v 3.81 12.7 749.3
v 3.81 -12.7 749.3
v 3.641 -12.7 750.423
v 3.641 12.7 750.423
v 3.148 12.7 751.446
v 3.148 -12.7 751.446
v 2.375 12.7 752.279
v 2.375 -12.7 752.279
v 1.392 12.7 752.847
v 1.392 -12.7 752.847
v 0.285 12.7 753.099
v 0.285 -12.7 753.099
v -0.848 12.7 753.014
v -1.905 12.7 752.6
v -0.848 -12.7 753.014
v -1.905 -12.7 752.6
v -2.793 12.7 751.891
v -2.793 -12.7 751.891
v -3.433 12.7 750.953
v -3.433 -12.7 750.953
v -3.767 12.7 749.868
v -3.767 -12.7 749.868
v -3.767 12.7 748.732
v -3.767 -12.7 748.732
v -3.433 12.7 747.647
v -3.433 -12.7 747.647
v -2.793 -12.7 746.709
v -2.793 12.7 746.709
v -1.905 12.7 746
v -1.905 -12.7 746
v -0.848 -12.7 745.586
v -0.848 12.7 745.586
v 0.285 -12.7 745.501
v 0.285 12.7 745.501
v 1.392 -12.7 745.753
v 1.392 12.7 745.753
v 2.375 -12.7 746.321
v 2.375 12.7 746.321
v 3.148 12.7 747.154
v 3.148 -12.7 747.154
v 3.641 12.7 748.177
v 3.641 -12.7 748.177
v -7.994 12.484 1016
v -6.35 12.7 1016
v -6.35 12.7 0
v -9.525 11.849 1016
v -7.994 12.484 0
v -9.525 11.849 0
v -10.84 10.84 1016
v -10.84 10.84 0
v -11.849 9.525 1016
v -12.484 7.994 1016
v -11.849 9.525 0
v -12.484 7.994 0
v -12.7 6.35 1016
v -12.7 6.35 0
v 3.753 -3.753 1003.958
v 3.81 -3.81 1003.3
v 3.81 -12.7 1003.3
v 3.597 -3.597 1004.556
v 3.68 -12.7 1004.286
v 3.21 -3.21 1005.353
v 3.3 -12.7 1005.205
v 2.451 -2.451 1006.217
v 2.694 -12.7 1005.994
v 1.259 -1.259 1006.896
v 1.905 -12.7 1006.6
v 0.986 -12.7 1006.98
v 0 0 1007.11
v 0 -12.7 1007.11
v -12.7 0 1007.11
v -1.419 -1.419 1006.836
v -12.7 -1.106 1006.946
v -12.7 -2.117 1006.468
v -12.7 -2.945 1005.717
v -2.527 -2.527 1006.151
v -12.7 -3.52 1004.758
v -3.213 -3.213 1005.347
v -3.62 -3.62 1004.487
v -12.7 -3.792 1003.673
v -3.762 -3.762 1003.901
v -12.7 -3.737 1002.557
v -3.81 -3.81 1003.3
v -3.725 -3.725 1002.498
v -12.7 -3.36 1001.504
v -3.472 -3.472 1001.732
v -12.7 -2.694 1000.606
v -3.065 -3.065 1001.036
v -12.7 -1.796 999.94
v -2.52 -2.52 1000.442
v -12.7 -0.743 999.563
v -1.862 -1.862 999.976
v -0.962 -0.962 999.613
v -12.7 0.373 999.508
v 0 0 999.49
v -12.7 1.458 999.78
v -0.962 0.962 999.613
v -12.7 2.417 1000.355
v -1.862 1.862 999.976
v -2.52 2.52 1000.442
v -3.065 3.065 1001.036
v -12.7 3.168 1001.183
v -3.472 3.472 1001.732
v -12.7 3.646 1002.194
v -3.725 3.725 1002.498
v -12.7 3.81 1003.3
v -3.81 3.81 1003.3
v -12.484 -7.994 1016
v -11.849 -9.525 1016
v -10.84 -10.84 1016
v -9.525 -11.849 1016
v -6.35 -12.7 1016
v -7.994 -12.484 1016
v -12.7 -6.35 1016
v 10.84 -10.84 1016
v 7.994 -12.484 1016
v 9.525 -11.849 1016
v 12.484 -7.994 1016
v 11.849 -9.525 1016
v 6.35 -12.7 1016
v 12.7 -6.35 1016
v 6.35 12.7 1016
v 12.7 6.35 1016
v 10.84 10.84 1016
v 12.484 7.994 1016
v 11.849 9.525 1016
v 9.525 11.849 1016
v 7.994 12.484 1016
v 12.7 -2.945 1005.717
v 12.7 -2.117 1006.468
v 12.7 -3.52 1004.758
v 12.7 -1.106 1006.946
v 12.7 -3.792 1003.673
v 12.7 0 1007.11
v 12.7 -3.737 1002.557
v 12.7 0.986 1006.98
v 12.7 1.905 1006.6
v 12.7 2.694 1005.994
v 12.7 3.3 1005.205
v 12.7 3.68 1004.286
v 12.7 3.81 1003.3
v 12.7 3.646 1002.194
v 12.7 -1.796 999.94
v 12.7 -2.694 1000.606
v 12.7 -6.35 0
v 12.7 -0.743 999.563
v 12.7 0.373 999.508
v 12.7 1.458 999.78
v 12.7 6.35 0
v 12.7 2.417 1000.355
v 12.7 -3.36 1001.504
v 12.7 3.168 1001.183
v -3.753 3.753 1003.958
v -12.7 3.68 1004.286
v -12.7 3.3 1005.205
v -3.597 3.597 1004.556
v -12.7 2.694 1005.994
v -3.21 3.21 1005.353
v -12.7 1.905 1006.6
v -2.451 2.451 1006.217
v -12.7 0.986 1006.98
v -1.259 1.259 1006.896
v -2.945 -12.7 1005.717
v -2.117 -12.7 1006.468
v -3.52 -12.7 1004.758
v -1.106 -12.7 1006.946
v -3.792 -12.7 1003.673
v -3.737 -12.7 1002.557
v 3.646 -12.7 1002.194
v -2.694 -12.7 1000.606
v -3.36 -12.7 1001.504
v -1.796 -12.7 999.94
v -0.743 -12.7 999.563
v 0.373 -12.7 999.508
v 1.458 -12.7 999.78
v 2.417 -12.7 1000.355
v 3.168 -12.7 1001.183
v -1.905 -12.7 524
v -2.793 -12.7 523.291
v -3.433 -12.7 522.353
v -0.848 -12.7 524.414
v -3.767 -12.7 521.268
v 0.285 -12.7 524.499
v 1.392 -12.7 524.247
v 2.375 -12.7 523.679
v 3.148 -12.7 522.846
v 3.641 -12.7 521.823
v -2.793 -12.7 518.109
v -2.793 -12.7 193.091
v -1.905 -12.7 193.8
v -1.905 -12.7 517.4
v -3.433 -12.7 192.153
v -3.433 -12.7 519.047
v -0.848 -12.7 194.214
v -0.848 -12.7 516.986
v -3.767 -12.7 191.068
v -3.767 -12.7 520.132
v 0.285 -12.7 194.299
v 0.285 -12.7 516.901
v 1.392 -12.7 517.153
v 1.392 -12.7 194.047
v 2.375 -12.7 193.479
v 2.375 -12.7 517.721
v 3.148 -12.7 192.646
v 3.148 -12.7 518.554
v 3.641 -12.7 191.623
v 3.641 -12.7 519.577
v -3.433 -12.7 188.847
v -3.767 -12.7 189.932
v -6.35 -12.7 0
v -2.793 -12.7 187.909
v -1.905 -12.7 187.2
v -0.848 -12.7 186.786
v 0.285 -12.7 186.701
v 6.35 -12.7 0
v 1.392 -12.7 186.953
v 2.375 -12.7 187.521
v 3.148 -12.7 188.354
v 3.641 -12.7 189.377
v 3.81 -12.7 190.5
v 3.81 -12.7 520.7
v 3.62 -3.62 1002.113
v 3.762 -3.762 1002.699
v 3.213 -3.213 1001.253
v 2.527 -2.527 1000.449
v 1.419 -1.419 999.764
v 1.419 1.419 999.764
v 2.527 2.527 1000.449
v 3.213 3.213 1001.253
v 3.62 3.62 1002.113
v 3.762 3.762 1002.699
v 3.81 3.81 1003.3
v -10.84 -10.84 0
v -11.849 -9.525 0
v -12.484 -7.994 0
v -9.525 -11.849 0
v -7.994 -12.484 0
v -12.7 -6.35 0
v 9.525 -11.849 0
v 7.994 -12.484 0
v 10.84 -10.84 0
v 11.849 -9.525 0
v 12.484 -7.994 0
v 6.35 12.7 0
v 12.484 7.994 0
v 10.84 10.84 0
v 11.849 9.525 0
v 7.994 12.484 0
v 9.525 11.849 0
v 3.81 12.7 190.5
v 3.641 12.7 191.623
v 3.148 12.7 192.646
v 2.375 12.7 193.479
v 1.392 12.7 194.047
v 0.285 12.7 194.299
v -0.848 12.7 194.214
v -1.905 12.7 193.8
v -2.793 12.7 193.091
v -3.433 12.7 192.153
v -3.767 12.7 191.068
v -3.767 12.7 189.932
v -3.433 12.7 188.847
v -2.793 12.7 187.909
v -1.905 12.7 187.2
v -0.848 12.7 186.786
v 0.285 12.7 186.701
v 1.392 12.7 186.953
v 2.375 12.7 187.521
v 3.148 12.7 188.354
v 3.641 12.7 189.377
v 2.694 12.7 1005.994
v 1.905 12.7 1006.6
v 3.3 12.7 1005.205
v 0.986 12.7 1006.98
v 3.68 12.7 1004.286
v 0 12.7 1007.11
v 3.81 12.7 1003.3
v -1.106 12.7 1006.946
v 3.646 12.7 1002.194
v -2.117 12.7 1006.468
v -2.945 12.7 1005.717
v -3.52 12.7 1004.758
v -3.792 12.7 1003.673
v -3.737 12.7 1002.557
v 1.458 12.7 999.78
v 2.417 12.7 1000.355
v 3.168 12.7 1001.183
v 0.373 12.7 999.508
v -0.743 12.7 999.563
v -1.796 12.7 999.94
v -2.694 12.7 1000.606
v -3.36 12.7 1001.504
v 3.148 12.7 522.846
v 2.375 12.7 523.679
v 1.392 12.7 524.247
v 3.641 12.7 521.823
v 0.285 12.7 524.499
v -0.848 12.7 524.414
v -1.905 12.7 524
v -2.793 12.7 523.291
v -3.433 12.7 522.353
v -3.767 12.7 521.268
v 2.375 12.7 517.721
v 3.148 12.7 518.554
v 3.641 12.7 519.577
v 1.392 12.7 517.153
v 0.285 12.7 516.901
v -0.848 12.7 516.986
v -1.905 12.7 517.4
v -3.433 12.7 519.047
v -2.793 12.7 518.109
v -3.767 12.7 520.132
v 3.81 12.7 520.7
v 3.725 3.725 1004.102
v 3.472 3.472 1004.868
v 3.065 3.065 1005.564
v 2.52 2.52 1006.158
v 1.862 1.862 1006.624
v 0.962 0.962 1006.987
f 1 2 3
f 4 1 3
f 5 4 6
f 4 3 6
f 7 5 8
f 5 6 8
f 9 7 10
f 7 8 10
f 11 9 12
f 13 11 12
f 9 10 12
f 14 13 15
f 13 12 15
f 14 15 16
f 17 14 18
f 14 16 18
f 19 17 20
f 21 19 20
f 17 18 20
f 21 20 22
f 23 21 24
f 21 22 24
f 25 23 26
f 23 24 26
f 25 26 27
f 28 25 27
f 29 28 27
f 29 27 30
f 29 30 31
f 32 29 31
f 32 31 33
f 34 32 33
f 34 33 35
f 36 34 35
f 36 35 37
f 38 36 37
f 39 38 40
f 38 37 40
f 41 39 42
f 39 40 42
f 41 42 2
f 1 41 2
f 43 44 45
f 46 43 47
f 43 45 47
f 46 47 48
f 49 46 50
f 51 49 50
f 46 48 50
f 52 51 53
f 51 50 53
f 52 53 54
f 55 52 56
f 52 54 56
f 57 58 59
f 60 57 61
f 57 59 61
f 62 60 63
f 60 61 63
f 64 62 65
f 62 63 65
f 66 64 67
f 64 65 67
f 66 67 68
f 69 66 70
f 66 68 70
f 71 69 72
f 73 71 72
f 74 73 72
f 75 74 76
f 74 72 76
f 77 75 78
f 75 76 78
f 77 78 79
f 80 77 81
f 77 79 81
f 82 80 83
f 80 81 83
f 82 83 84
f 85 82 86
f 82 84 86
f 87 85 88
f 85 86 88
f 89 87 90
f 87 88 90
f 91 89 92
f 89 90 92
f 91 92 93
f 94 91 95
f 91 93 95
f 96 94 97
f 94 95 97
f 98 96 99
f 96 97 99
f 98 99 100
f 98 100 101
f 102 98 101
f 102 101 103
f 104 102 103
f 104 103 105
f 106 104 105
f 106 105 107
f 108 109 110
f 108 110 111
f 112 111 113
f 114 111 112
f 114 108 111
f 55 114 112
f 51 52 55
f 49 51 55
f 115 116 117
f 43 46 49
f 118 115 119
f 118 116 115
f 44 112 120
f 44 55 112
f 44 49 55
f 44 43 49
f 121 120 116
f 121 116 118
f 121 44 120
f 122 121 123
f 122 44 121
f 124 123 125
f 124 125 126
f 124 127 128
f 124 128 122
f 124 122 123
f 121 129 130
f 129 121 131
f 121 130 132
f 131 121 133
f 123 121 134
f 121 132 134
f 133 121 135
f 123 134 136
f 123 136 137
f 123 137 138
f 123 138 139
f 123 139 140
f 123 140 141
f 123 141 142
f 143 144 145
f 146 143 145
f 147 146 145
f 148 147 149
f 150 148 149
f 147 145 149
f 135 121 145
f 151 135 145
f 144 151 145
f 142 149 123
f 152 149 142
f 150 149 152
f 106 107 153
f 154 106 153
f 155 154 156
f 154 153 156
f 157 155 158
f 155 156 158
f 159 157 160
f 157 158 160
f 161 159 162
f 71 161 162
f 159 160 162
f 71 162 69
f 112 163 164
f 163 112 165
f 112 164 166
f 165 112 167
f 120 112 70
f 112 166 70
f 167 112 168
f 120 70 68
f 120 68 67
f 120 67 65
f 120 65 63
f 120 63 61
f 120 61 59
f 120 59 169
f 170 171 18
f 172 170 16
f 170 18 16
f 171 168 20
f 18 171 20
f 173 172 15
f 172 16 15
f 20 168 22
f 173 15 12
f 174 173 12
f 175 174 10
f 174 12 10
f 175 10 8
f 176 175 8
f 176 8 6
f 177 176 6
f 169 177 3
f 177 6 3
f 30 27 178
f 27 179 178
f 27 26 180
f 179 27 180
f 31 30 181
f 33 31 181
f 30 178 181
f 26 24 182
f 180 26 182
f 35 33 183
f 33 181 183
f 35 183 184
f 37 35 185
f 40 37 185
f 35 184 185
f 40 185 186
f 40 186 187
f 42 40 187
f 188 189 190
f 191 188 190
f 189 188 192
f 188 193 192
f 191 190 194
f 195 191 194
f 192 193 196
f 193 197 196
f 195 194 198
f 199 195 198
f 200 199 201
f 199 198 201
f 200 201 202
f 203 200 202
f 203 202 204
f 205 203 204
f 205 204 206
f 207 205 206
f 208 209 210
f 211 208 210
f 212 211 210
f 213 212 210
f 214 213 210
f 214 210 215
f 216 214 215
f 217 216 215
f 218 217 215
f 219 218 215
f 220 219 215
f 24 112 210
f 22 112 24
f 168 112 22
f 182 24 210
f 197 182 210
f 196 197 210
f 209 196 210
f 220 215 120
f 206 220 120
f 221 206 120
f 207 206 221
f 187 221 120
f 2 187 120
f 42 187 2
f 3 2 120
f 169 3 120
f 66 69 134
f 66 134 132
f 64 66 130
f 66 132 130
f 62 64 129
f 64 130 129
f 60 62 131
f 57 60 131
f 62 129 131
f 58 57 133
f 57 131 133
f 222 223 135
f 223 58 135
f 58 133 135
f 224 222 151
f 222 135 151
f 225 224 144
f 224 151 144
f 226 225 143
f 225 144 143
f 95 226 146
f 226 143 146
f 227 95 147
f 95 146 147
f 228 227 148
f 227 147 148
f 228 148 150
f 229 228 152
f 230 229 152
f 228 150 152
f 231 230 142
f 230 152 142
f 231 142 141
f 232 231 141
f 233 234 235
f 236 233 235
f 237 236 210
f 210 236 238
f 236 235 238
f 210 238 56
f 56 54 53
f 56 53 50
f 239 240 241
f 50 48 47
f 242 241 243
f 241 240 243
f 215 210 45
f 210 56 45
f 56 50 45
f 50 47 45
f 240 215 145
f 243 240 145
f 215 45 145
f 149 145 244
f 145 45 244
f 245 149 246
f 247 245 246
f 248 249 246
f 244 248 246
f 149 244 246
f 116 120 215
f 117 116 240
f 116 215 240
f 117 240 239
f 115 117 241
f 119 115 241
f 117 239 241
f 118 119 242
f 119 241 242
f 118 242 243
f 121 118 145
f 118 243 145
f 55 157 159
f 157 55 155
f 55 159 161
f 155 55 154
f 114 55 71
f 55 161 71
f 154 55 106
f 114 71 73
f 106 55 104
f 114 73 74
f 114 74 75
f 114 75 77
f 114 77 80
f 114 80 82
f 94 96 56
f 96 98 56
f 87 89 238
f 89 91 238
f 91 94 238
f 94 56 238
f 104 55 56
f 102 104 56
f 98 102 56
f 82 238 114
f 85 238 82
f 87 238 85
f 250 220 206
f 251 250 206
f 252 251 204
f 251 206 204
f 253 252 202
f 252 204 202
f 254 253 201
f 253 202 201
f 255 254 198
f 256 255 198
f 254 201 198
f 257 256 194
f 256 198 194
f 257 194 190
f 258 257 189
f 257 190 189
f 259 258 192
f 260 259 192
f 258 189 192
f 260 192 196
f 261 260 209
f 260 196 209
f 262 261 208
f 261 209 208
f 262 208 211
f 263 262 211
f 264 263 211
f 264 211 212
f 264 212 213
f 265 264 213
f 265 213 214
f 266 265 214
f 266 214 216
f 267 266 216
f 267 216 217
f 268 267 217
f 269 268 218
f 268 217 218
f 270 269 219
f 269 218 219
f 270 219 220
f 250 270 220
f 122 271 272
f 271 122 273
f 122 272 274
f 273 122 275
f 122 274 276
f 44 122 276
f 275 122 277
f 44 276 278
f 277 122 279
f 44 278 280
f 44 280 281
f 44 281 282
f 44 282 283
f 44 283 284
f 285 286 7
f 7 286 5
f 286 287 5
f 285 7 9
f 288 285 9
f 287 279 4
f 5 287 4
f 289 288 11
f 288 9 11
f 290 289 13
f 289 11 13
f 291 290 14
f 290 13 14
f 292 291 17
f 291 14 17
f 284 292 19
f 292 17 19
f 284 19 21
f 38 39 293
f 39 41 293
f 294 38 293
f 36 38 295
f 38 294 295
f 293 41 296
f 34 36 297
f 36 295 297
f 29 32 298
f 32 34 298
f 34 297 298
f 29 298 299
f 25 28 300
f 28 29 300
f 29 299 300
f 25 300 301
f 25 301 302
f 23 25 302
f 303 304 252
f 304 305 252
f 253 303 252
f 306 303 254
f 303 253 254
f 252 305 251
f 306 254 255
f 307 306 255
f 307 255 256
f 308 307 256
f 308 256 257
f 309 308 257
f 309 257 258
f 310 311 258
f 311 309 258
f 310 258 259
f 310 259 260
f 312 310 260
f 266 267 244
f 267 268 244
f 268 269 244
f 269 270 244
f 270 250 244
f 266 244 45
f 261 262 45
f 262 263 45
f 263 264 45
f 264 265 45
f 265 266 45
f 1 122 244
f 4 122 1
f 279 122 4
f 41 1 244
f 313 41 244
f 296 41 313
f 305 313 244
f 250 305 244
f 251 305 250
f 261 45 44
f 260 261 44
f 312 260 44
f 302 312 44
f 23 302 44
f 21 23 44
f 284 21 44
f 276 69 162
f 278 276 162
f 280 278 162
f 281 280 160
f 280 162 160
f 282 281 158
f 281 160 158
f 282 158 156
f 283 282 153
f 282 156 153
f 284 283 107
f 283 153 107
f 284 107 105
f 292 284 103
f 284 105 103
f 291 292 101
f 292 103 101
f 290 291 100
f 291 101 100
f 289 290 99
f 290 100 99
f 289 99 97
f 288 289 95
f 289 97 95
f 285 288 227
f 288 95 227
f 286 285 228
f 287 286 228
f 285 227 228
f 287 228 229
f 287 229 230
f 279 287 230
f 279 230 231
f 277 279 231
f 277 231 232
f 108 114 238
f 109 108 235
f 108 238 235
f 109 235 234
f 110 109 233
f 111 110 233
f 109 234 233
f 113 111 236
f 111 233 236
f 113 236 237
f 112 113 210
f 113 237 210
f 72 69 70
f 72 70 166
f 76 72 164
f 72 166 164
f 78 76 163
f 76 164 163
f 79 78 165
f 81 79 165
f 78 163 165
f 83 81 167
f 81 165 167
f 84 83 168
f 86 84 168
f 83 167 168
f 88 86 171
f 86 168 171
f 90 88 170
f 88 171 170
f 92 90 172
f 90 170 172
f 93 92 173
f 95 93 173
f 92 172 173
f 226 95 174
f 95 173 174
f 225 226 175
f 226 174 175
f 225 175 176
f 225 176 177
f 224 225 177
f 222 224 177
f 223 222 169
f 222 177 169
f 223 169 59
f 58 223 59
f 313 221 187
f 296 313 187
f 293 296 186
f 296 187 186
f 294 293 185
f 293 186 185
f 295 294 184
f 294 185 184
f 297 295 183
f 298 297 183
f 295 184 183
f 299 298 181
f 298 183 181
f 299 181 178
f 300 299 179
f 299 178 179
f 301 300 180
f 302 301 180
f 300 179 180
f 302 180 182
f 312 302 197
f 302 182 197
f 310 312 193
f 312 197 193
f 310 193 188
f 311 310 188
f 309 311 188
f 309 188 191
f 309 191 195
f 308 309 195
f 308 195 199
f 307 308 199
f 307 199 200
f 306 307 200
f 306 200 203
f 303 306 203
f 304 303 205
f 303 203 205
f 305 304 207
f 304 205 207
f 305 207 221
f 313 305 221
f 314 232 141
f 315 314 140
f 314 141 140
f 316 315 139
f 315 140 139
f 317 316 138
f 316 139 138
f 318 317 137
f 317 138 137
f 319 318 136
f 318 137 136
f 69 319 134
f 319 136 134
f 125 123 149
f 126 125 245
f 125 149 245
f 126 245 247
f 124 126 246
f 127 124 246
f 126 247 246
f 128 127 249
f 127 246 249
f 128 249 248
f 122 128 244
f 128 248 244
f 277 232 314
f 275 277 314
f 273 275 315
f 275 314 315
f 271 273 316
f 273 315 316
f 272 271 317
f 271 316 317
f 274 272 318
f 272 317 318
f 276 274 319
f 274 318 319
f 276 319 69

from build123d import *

# Parameters (mm, degrees)
F1_DEPTH = 1016
F3_DEPTH = 25.4
F5_DEPTH = 25.4
F2_R     = 3.81
F6_DEPTH = 25.4
F7_DEPTH = 25.4


# Not quite as in the source:
# - a feature names something its author has since deleted; it is built from what else it names


with BuildPart() as f1:
    # F0 (on Top) → F1 (new body)
    with BuildSketch(Plane.XY):
        with BuildLine():
            ThreePointArc((12.7, 6.35), (10.8401280605, 10.8401280605), (6.35, 12.7))
            Line((6.35, 12.7), (-6.35, 12.7))
            ThreePointArc((-6.35, 12.7), (-10.8401280605, 10.8401280605), (-12.7, 6.35))
            Line((-12.7, 6.35), (-12.7, -6.35))
            ThreePointArc((-12.7, -6.35), (-10.8401280605, -10.8401280605), (-6.35, -12.7))
            Line((-6.35, -12.7), (6.35, -12.7))
            ThreePointArc((6.35, -12.7), (10.8401280605, -10.8401280605), (12.7, -6.35))
            Line((12.7, -6.35), (12.7, 6.35))
        make_face()
    extrude(amount=F1_DEPTH)

    # F2 (on face) → F3 (cut)
    with BuildSketch(Plane.XZ.offset(12.7)):
        with BuildLine():
            ThreePointArc((3.81, 1003.3), (2.6940768363, 1005.9940768363), (0, 1007.11))
            ThreePointArc((0, 1007.11), (-2.6940768363, 1000.6059231637), (3.81, 1003.3))
        make_face()
    extrude(amount=-F3_DEPTH, mode=Mode.SUBTRACT)

    # F4 (on face) → F5 (cut)
    with BuildSketch(Plane.YZ.offset(12.7)):
        with BuildLine():
            ThreePointArc((3.81, 1003.3), (2.6940768363, 1005.9940768363), (0, 1007.11))
            ThreePointArc((0, 1007.11), (-2.6940768363, 1000.6059231637), (3.81, 1003.3))
        make_face()
    extrude(amount=-F5_DEPTH, mode=Mode.SUBTRACT)

    # F2 (on face) → F6 (cut)
    with BuildSketch(Plane.XZ.offset(12.7)):
        with Locations((0, 749.3)):
            Circle(F2_R)
        with Locations((0, 520.7)):
            Circle(F2_R)
    extrude(amount=-F6_DEPTH, mode=Mode.SUBTRACT)

    # F2 (on face) → F7 (cut)
    with BuildSketch(Plane.XZ.offset(12.7)):
        with Locations((0, 190.5)):
            Circle(F2_R)
    extrude(amount=-F7_DEPTH, mode=Mode.SUBTRACT)


solid = f1.part
